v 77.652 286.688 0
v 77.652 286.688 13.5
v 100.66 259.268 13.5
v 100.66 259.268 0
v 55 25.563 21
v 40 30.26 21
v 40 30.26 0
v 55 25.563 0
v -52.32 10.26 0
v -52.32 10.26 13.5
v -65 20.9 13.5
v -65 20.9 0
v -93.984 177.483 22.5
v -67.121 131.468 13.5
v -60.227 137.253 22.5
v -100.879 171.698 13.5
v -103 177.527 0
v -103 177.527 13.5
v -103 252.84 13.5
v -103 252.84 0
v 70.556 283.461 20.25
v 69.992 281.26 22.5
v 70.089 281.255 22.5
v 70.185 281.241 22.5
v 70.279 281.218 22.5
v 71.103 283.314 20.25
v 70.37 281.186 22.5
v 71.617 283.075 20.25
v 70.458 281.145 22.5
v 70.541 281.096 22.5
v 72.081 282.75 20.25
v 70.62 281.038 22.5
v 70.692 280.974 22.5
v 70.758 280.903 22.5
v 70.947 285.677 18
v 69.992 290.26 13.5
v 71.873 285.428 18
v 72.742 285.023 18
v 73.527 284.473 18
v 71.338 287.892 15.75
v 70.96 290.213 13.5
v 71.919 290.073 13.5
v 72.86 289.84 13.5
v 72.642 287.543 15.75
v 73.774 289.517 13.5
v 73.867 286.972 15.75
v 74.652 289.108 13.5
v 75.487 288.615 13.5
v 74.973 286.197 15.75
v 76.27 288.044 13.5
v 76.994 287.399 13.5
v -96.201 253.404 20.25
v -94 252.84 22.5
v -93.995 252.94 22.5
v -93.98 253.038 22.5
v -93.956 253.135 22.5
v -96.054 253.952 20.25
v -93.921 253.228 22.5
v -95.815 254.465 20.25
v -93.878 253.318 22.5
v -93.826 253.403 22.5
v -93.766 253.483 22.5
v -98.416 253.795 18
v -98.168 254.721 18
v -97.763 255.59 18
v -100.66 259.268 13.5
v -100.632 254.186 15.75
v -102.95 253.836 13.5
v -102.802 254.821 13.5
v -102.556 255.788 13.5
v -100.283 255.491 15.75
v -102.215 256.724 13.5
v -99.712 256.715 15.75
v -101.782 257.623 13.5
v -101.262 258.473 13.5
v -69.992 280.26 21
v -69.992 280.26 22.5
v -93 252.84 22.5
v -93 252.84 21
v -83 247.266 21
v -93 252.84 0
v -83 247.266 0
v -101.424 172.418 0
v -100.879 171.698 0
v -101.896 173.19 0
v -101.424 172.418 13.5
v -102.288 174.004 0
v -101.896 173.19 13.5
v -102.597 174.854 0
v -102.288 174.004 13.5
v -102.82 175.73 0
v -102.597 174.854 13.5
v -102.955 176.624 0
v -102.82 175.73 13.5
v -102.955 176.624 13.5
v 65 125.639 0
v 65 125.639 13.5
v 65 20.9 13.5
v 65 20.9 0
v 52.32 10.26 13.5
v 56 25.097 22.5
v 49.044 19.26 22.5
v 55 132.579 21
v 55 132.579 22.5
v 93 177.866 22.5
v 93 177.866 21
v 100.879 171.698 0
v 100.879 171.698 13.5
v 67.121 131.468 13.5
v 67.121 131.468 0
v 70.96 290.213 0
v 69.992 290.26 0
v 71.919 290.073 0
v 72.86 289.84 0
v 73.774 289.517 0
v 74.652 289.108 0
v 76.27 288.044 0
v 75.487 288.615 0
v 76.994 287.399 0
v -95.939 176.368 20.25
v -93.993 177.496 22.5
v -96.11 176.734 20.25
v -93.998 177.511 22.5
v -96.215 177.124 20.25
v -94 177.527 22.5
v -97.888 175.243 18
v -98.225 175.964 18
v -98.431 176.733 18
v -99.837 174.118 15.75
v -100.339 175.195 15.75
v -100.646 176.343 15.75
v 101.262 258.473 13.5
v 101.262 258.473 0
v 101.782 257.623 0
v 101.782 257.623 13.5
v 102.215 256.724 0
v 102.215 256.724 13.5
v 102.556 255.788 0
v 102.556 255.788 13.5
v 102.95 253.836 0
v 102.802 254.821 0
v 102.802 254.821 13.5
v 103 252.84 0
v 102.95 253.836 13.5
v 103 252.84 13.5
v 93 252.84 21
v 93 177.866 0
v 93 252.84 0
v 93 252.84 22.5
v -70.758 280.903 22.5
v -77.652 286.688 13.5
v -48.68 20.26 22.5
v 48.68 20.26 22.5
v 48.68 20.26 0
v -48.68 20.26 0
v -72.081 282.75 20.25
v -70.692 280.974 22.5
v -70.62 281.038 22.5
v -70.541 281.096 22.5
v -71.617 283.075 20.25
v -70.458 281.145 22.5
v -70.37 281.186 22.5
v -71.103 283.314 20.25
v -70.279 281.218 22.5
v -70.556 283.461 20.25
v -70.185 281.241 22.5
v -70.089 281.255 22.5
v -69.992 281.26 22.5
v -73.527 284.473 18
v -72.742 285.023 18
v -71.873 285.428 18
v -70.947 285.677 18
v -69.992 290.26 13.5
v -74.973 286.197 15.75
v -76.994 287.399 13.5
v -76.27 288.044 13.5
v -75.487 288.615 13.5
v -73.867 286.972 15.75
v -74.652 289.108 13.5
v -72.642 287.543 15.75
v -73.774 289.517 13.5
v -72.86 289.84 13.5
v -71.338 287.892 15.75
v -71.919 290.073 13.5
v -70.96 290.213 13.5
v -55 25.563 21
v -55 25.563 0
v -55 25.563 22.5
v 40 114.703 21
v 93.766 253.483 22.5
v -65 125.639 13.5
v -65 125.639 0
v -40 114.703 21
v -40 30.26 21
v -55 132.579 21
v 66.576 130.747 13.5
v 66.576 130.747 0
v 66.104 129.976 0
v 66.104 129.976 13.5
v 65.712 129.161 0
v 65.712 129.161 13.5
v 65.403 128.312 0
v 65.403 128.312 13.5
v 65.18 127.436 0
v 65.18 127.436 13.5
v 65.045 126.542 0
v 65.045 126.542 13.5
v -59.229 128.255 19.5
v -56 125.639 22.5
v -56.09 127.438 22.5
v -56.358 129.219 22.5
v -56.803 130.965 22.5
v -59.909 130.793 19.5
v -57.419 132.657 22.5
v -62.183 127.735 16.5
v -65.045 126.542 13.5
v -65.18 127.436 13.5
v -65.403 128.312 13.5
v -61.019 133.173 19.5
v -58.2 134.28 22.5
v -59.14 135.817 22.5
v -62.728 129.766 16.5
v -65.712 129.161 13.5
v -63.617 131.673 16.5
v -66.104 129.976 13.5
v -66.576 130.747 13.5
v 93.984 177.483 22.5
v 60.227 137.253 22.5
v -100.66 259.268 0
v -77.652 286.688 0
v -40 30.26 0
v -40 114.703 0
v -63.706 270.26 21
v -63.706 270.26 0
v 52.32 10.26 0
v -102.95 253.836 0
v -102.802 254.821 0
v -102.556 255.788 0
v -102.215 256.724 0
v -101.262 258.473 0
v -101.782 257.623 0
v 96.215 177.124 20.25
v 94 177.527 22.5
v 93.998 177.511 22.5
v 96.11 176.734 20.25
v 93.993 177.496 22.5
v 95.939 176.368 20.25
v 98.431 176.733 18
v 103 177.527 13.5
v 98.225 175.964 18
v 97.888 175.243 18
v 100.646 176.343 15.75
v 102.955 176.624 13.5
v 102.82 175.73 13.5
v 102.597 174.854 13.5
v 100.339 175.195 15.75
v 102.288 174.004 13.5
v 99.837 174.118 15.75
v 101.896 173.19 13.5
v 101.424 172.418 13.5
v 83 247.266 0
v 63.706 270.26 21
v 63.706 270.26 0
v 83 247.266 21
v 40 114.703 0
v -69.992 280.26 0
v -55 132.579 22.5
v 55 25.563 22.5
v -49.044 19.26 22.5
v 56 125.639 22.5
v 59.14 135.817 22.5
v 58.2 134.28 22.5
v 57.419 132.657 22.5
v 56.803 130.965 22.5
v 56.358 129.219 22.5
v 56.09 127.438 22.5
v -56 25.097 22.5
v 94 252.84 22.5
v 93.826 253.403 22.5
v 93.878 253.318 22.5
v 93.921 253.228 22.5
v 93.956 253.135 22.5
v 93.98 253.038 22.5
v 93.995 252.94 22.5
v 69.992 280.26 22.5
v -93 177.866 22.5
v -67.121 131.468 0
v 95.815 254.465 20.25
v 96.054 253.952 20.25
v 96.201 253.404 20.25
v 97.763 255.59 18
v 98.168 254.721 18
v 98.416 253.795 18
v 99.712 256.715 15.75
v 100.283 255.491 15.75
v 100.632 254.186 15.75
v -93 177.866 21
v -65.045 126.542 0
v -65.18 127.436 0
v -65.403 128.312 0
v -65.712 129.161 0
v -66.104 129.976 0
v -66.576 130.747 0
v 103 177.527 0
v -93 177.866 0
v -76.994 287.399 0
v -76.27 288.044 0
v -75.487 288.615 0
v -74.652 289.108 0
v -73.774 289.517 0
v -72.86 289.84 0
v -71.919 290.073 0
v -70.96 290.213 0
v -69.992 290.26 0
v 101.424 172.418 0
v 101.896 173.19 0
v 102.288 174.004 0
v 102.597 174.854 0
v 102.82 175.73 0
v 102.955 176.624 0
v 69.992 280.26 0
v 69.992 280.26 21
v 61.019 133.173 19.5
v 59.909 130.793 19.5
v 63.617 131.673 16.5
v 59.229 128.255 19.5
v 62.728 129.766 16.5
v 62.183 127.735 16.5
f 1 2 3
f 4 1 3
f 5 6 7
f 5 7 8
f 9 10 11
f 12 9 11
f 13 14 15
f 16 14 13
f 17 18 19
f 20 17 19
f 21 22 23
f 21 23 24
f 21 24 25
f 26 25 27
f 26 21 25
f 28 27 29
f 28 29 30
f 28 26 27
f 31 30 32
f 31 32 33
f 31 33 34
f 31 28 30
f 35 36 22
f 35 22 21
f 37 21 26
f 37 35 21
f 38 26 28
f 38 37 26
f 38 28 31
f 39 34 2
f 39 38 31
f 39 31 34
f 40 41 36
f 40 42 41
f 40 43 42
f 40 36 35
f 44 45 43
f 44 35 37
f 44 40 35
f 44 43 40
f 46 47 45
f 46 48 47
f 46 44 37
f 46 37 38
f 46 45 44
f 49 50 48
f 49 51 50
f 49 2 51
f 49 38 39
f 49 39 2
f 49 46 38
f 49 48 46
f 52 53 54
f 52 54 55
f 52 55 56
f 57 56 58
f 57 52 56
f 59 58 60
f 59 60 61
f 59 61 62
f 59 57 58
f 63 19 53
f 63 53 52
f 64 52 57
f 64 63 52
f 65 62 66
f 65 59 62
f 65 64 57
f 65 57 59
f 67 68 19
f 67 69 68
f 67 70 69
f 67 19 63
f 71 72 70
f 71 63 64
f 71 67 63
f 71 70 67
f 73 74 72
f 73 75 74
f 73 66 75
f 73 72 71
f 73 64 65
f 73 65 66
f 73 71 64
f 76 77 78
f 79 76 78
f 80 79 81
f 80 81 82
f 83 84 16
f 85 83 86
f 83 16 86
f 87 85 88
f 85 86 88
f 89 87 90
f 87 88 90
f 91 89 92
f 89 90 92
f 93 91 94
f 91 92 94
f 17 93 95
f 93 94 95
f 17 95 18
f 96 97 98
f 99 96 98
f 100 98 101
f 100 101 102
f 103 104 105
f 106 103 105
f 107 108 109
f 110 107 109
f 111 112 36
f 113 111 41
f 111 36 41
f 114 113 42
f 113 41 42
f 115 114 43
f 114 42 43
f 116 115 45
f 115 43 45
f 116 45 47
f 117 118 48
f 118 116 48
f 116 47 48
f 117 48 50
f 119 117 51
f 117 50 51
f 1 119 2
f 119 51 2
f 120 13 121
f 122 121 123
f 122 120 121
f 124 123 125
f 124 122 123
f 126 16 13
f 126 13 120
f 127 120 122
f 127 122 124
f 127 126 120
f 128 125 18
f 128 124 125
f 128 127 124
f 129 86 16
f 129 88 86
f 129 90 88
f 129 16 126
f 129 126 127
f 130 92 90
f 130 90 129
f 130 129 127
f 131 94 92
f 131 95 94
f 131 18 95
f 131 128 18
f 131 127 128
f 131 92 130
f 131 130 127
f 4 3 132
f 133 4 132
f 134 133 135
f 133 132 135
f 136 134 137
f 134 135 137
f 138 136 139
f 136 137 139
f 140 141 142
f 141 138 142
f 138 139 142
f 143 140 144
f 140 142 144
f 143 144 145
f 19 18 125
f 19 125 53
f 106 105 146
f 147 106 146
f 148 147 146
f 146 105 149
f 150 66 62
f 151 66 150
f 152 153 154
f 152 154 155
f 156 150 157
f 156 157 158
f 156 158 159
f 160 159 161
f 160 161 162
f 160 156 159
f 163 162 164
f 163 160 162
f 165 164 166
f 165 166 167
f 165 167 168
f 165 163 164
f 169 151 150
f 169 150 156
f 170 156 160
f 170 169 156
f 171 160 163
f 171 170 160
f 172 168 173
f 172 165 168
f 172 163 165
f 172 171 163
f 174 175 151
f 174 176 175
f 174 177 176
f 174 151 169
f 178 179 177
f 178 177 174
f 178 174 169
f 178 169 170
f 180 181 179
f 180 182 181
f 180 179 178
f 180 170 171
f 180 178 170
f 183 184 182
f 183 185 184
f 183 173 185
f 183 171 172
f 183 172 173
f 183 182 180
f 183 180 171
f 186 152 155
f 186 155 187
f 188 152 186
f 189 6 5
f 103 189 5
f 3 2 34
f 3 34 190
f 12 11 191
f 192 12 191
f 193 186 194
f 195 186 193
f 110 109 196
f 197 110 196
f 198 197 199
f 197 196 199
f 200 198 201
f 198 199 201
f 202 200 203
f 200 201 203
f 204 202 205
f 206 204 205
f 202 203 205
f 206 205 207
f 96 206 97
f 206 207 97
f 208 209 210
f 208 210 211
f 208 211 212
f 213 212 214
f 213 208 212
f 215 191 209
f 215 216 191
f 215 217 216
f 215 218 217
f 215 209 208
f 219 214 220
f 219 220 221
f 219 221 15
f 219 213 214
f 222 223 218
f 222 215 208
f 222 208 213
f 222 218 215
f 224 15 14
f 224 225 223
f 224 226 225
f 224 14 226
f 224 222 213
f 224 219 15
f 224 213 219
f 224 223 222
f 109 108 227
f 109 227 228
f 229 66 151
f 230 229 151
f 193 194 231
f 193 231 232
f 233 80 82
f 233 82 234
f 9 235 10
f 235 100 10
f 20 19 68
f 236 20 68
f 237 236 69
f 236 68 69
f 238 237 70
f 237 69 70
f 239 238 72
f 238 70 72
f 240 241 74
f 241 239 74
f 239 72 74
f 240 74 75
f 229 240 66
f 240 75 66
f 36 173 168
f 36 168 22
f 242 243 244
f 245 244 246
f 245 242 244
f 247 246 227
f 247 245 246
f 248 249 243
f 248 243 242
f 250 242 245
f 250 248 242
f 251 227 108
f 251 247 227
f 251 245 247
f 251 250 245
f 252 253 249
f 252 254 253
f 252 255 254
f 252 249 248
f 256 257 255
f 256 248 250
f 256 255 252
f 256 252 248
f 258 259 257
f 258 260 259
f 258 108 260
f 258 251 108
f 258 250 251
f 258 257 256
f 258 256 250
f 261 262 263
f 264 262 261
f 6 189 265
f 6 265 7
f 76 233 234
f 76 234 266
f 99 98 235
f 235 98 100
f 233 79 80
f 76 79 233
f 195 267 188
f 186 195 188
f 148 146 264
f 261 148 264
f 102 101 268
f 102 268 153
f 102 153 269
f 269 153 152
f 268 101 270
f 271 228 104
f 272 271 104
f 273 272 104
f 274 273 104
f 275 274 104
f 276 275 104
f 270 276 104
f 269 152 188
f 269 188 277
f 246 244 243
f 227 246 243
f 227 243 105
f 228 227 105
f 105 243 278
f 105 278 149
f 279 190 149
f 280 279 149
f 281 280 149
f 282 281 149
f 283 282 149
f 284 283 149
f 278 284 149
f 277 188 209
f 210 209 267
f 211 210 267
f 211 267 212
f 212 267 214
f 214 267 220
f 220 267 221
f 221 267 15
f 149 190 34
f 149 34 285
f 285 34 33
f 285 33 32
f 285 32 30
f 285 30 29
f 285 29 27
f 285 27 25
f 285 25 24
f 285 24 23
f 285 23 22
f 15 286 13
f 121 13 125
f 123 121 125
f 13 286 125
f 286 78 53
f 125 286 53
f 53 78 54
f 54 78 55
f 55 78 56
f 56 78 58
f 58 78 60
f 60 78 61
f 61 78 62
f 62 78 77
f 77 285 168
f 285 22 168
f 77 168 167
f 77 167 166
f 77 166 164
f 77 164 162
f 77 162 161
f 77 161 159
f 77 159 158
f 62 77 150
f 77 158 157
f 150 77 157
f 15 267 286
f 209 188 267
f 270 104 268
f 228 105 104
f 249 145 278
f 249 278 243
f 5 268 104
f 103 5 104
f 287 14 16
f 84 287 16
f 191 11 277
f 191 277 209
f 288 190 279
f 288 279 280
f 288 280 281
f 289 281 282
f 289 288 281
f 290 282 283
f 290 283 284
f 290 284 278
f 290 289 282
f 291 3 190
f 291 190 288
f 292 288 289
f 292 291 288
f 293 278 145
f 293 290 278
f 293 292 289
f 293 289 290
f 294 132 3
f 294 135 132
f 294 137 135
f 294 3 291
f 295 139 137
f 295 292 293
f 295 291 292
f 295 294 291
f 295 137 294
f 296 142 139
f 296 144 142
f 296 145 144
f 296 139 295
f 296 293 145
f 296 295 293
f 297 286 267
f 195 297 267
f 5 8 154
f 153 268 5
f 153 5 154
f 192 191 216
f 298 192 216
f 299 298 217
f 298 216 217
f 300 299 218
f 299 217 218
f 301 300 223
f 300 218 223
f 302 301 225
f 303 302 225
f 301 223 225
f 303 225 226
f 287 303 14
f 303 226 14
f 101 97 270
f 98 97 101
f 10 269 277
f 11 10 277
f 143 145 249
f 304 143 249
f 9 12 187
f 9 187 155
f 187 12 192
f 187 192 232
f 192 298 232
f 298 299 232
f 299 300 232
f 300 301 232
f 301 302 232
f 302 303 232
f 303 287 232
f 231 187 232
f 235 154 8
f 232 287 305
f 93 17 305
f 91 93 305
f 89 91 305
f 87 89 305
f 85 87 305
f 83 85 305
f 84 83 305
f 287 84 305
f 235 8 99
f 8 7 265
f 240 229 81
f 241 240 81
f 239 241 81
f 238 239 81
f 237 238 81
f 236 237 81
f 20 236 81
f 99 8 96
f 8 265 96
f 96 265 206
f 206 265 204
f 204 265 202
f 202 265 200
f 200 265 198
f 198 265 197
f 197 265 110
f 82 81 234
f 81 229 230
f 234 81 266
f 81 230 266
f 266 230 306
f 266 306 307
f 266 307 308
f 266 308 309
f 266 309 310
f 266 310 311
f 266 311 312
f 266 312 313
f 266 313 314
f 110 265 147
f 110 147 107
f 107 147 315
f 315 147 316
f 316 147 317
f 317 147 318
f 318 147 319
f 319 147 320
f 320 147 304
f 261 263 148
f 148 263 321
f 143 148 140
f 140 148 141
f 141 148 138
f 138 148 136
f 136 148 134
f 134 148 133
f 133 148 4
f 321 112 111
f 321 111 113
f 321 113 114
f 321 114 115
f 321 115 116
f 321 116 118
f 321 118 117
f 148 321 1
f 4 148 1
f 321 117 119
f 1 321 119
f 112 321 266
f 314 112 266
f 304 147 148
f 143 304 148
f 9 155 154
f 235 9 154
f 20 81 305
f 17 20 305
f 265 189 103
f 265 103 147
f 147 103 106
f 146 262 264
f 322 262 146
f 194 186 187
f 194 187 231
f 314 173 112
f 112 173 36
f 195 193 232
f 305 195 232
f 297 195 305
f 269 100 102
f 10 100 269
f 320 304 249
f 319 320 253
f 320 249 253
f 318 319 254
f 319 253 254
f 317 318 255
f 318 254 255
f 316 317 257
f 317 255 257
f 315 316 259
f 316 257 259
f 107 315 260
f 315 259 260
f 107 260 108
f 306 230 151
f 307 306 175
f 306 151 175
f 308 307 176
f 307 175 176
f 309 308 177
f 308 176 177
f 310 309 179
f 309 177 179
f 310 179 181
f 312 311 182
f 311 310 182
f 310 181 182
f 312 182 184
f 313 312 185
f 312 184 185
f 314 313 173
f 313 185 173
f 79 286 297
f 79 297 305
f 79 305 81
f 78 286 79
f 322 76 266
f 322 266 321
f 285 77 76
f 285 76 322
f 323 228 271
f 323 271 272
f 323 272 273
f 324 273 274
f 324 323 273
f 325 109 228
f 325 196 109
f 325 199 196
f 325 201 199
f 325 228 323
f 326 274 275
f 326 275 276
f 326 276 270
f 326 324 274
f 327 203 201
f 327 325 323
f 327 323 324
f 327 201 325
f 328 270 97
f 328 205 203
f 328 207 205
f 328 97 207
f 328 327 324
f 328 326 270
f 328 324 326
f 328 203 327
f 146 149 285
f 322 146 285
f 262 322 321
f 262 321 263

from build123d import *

# Parameters (mm, degrees)
RESSALTO_EXTRUS_O1_DEPTH = 22.5
CHANFRO1_SIZE            = 9
CORTE_EXTRUS_O1_REACH    = 24.5
ESBO_O3_W                = 1139.230904301
ESBO_O3_H                = 709.798033895
CORTE_EXTRUS_O5_DEPTH    = 1.5
CORTE_EXTRUS_O6_REACH    = 23


with BuildPart() as part:
    # Esboço1 → Ressalto-extrusão1 (new body, symmetric)
    with BuildSketch(Plane.XY):
        with BuildLine():
            Line((-69.991831819, 290.260059805), (69.991831819, 290.260059805))
            ThreePointArc((69.991831819, 290.260059805), (74.218014437, 289.323137676), (77.652276251, 286.687935902))
            Line((77.652276251, 286.687935902), (100.660444431, 259.267868814))
            ThreePointArc((100.660444431, 259.267868814), (102.396926208, 256.26019415), (103, 252.839992717))
            Line((103, 252.839992717), (103, 177.526516487))
            ThreePointArc((103, 177.526516487), (102.453136861, 174.425101506), (100.878507208, 171.697762944))
            Line((100.878507208, 171.697762944), (67.121492792, 131.46771974))
            ThreePointArc((67.121492792, 131.46771974), (65.546863139, 128.740381178), (65, 125.638966197))
            Line((65, 125.638966197), (65, 20.90019601))
            Line((65, 20.90019601), (52.319579452, 10.260059805))
            Line((52.319579452, 10.260059805), (-52.319579452, 10.260059805))
            Line((-52.319579452, 10.260059805), (-65, 20.90019601))
            Line((-65, 20.90019601), (-65, 125.638966197))
            ThreePointArc((-65, 125.638966197), (-65.546863139, 128.740381178), (-67.121492792, 131.46771974))
            Line((-67.121492792, 131.46771974), (-100.878507208, 171.697762944))
            ThreePointArc((-100.878507208, 171.697762944), (-102.453136861, 174.425101506), (-103, 177.526516487))
            Line((-103, 177.526516487), (-103, 252.839992717))
            ThreePointArc((-103, 252.839992717), (-102.396926208, 256.26019415), (-100.660444431, 259.267868814))
            Line((-100.660444431, 259.267868814), (-77.652276251, 286.687935902))
            ThreePointArc((-77.652276251, 286.687935902), (-74.218014437, 289.323137676), (-69.991831819, 290.260059805))
        make_face()
        Polygon((-63.705668081, 270.260059805), (63.705668081, 270.260059805), (83, 247.265970424), (83, 181.505464287), (40, 130.260059805), (40, 30.260059805), (-40, 30.260059805), (-40, 130.260059805), (-83, 181.505464287), (-83, 247.265970424), align=None, mode=Mode.SUBTRACT)
    extrude(amount=RESSALTO_EXTRUS_O1_DEPTH, both=True)

    # Chanfro1
    chanfro1_edges = [part.edges().sort_by_distance(p)[0] for p in [
        (65, 73.269581104, 22.5),
        (65.546863139, 128.740381178, 22.5),
        (84, 151.582741342, 22.5),
        (102.453136861, 174.425101506, 22.5),
        (103, 215.183254602, 22.5),
        (102.396926208, 256.26019415, 22.5),
        (89.156360341, 272.977902358, 22.5),
        (74.218014437, 289.323137676, 22.5),
        (0, 290.260059805, 22.5),
        (-74.218014437, 289.323137676, 22.5),
        (-89.156360341, 272.977902358, 22.5),
        (-102.396926208, 256.26019415, 22.5),
        (-103, 215.183254602, 22.5),
        (-102.453136861, 174.425101506, 22.5),
        (-84, 151.582741342, 22.5),
        (-65.546863139, 128.740381178, 22.5),
        (-65, 73.269581104, 22.5),
        (-58.659789726, 15.580127908, 22.5),
        (0, 10.260059805, 22.5),
        (58.659789726, 15.580127908, 22.5),
    ]]
    chamfer(chanfro1_edges, length=CHANFRO1_SIZE)

    # Esboço3 → Corte-extrusão1 (cut, up to next)
    with BuildSketch(Plane.XY, mode=Mode.PRIVATE) as corte_extrus_o1_sk1:
        with Locations((-153.157436203, 152.53565808)):
            Rectangle(ESBO_O3_W, ESBO_O3_H)
    corte_extrus_o1_tool1 = extrude(corte_extrus_o1_sk1.sketch, amount=-CORTE_EXTRUS_O1_REACH, mode=Mode.PRIVATE) & part.part
    add(corte_extrus_o1_tool1.solids().sort_by_distance((-153.157436, 152.535658, 0))[0], mode=Mode.SUBTRACT)

    # Esboço4 → Corte-extrusão5 (cut)
    with BuildSketch(Plane.XY.offset(22.5)):
        Polygon((69.991831819, 280.260059805), (-69.991831819, 280.260059805), (-93, 252.839992717), (-93, 177.865761944), (-55, 132.579125426), (-55, 25.563272592), (-48.679877109, 20.260059805), (48.679877109, 20.260059805), (55, 25.563272592), (55, 132.579125426), (93, 177.865761944), (93, 252.839992717), align=None)
        Polygon((40, 30.260059805), (-40, 30.260059805), (-40, 130.260059805), (-83, 181.505464287), (-83, 247.265970424), (-63.705668081, 270.260059805), (63.705668081, 270.260059805), (83, 247.265970424), (83, 181.505464287), (40, 130.260059805), align=None, mode=Mode.SUBTRACT)
    extrude(amount=-CORTE_EXTRUS_O5_DEPTH, mode=Mode.SUBTRACT)

    # Esboço5 → Corte-extrusão6 (cut, up to next)
    with BuildSketch(Plane.XY.offset(21), mode=Mode.PRIVATE) as corte_extrus_o6_sk1:
        Polygon((-93, 252.839992717), (-83, 247.265970424), (-83, 181.505464287), (-40, 130.260059805), (-40, 114.702821537), (-93, 177.865761944), align=None)
    corte_extrus_o6_tool1 = extrude(corte_extrus_o6_sk1.sketch, amount=-CORTE_EXTRUS_O6_REACH, mode=Mode.PRIVATE) & part.part
    add(corte_extrus_o6_tool1.solids().sort_by_distance((-88.720359, 248.760631, 21))[0], mode=Mode.SUBTRACT)
    # Esboço5 → Corte-extrusão6 (cut, up to next)
    with BuildSketch(Plane.XY.offset(21), mode=Mode.PRIVATE) as corte_extrus_o6_sk2:
        Polygon((-63.705668081, 270.260059805), (-69.991831819, 280.260059805), (69.991831819, 280.260059805), (63.705668081, 270.260059805), align=None)
    corte_extrus_o6_tool2 = extrude(corte_extrus_o6_sk2.sketch, amount=-CORTE_EXTRUS_O6_REACH, mode=Mode.PRIVATE) & part.part
    add(corte_extrus_o6_tool2.solids().sort_by_distance((0, 275.338423, 21))[0], mode=Mode.SUBTRACT)
    # Esboço5 → Corte-extrusão6 (cut, up to next)
    with BuildSketch(Plane.XY.offset(21), mode=Mode.PRIVATE) as corte_extrus_o6_sk3:
        Polygon((-55, 25.563272592), (-40, 30.260059805), (40, 30.260059805), (55, 25.563272592), (48.679877109, 20.260059805), (-48.679877109, 20.260059805), align=None)
    corte_extrus_o6_tool3 = extrude(corte_extrus_o6_sk3.sketch, amount=-CORTE_EXTRUS_O6_REACH, mode=Mode.PRIVATE) & part.part
    add(corte_extrus_o6_tool3.solids().sort_by_distance((0, 25.125903, 21))[0], mode=Mode.SUBTRACT)
    # Esboço5 → Corte-extrusão6 (cut, up to next)
    with BuildSketch(Plane.XY.offset(21), mode=Mode.PRIVATE) as corte_extrus_o6_sk4:
        Polygon((40, 114.702821537), (93, 177.865761944), (93, 252.839992717), (83, 247.265970424), (83, 181.505464287), (40, 130.260059805), align=None)
    corte_extrus_o6_tool4 = extrude(corte_extrus_o6_sk4.sketch, amount=-CORTE_EXTRUS_O6_REACH, mode=Mode.PRIVATE) & part.part
    add(corte_extrus_o6_tool4.solids().sort_by_distance((65.366594, 147.235332, 21))[0], mode=Mode.SUBTRACT)


solid = part.part
